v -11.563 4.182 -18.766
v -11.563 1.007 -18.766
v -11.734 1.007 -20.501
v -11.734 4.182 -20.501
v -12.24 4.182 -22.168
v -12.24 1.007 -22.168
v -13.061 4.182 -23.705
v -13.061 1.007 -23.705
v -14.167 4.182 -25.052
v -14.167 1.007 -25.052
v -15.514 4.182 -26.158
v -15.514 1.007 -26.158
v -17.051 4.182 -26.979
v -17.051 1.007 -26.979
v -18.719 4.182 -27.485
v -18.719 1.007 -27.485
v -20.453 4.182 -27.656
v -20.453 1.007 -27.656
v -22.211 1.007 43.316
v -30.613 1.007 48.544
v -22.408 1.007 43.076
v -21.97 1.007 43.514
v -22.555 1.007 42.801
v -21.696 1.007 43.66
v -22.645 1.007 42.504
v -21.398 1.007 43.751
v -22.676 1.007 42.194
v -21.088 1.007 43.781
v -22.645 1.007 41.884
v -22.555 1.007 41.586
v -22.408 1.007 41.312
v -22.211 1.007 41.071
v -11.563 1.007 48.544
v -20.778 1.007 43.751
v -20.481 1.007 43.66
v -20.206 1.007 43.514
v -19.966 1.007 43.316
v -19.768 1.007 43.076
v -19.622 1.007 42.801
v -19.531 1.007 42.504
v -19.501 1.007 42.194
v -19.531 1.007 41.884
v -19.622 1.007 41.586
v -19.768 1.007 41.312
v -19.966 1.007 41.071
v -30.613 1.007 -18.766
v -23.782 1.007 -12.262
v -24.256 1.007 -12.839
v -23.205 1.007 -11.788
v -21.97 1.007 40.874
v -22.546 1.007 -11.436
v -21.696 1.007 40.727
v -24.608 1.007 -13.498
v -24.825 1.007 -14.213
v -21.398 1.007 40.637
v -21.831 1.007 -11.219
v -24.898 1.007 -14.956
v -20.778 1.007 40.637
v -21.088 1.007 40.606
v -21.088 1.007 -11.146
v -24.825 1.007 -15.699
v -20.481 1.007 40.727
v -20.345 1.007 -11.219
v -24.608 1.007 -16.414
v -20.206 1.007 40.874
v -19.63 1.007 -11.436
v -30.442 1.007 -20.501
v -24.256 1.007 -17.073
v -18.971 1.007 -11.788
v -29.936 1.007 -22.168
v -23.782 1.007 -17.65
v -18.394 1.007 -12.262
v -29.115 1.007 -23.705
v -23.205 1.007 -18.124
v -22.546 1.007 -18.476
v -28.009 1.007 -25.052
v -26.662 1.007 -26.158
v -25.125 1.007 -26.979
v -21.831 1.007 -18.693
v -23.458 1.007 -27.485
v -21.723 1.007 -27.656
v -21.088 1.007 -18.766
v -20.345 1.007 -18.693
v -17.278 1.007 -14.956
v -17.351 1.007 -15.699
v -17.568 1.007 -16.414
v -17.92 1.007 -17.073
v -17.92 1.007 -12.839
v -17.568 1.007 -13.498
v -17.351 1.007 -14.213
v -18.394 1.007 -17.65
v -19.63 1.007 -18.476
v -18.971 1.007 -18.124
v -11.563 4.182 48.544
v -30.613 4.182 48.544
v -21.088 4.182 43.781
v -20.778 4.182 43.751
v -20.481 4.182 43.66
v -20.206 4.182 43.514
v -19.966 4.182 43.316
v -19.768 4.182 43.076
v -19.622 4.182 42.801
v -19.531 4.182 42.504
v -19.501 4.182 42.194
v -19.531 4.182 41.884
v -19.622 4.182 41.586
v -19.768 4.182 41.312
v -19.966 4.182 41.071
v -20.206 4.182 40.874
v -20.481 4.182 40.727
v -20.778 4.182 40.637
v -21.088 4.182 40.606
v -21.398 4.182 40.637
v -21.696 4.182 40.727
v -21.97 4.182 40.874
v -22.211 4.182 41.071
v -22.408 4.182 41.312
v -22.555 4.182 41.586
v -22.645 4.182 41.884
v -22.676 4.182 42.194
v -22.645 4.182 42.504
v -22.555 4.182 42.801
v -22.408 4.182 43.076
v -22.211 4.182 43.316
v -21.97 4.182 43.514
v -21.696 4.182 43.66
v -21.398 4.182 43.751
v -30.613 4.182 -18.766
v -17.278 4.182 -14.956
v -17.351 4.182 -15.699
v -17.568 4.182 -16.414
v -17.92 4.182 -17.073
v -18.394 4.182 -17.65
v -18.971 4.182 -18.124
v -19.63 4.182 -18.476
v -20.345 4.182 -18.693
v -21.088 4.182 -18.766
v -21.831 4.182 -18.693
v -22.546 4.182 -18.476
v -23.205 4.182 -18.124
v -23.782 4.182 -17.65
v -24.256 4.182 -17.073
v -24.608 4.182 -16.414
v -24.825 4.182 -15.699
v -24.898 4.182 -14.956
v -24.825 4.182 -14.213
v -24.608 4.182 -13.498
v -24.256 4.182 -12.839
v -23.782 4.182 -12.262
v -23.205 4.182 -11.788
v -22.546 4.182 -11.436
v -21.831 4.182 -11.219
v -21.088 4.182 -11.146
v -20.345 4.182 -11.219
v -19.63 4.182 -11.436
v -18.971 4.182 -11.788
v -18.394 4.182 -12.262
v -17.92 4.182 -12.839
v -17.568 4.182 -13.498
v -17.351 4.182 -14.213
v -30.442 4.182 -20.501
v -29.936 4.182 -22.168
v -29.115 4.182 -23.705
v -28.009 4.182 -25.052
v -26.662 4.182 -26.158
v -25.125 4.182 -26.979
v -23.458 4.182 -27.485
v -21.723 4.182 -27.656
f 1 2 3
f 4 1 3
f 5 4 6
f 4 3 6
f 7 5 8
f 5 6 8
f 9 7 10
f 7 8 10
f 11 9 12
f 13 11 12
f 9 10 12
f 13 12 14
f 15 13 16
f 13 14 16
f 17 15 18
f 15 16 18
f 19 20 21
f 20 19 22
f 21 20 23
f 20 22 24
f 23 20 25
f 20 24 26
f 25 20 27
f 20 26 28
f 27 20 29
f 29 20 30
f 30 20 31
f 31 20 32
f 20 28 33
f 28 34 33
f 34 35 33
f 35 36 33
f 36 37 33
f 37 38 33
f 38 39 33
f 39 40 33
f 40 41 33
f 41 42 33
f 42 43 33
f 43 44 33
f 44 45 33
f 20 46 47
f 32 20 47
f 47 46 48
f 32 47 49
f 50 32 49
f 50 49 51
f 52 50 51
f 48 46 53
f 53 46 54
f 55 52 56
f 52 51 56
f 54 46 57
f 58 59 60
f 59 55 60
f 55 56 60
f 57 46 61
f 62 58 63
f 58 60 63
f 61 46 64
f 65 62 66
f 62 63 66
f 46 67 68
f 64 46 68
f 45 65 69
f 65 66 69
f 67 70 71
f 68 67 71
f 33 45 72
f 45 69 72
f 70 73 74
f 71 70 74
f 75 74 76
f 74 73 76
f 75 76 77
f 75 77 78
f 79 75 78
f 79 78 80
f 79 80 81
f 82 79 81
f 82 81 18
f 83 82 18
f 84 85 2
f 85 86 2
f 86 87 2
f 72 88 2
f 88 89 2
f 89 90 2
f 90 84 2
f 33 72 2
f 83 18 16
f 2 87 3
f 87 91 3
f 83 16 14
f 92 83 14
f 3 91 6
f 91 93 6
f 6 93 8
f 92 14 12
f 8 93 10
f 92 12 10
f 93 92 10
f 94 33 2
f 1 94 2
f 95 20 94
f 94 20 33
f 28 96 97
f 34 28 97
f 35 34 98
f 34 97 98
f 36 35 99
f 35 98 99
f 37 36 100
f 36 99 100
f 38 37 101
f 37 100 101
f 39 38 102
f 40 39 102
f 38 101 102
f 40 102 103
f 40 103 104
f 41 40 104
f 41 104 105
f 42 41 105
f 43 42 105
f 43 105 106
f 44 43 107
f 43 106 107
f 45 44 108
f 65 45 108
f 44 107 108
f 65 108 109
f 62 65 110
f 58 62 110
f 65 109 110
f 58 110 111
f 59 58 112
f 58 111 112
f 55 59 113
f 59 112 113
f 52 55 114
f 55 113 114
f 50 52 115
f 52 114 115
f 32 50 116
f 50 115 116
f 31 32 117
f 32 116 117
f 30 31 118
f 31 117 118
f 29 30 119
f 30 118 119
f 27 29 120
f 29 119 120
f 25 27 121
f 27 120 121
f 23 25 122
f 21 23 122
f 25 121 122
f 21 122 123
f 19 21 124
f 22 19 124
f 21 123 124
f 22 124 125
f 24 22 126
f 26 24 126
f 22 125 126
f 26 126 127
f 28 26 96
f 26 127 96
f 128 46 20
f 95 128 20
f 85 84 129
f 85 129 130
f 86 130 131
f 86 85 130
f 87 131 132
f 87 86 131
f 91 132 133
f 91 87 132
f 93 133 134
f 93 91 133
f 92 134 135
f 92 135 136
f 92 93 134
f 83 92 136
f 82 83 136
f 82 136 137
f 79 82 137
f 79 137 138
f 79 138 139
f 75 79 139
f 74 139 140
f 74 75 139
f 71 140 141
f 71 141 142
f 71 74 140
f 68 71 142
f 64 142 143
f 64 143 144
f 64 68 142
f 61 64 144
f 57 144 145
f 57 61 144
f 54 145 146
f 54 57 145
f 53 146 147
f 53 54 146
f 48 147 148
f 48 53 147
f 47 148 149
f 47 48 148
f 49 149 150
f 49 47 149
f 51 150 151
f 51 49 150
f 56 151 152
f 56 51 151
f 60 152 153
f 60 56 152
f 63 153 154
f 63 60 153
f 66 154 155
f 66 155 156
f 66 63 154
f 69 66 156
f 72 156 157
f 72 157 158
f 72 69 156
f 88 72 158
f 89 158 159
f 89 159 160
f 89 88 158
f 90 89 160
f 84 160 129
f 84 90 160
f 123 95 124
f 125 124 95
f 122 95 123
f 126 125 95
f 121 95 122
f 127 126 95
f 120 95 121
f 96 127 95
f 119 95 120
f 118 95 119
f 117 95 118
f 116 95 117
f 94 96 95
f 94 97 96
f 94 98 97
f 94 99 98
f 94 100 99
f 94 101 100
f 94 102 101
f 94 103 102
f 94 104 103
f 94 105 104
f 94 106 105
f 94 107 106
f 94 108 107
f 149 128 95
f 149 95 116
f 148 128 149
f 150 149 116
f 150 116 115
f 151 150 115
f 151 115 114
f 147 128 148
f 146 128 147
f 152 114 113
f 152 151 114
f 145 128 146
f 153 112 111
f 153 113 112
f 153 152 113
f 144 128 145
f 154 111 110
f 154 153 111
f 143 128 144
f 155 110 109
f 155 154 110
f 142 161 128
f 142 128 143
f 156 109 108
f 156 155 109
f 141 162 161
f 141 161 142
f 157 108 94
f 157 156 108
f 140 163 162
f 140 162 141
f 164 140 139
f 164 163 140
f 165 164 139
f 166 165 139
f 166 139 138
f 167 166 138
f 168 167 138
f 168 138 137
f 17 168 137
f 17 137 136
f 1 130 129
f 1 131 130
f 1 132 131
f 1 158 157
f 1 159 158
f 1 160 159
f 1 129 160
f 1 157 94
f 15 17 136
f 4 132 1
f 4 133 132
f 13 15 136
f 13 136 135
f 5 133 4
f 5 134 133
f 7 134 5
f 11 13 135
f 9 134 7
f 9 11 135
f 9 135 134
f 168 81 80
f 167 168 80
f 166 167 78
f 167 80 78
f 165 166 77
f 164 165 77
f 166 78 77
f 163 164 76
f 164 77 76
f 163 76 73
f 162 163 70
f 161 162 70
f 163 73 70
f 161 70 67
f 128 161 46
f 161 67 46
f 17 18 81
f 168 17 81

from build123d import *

# Parameters (mm, degrees)
STEM_START                = 1.006990195
STEM_OTHER_SIDE_OUTLINE_R = 3.81
STEM_OTHER_SIDE_DEPTH     = 3.175
SKETCH1_R                 = 1.5875
CUT_EXTRUDE1_DEPTH        = 3.175


# Read off the part's stored shape, not the designer's step: Stem Other Side
with BuildPart() as part:
    # Stem Other Side outline → Stem Other Side (new body)
    with BuildSketch(Plane(origin=(0, 0, 0), x_dir=(1, 0, 0), z_dir=(0, 1, 0)).offset(STEM_START)):
        with BuildLine():
            Line((-20.453203013, 27.656176961), (-21.723203013, 27.656176961))
            ThreePointArc((-21.723203013, 27.656176961), (-28.009382298, 25.052356246), (-30.613203013, 18.766176961))
            Line((-30.613203013, 18.766176961), (-30.613203013, -48.543823039))
            Line((-30.613203013, -48.543823039), (-11.563203013, -48.543823039))
            Line((-11.563203013, -48.543823039), (-11.563203013, 18.766176961))
            ThreePointArc((-11.563203013, 18.766176961), (-14.167023728, 25.052356246), (-20.453203013, 27.656176961))
        make_face()
        with Locations((-21.088203013, 14.956176961)):
            Circle(STEM_OTHER_SIDE_OUTLINE_R, mode=Mode.SUBTRACT)
    extrude(amount=STEM_OTHER_SIDE_DEPTH)

    # Sketch1 → Cut-Extrude1 (cut)
    with BuildSketch(Plane(origin=(0, 4.181990195, 0), x_dir=(1, 0, 0), z_dir=(0, 1, 0))):
        with Locations(Location((-21.088203013, -42.193823039, 0), (0, 0, 270))):
            Circle(SKETCH1_R)
    extrude(amount=-CUT_EXTRUDE1_DEPTH, mode=Mode.SUBTRACT)


solid = part.part
